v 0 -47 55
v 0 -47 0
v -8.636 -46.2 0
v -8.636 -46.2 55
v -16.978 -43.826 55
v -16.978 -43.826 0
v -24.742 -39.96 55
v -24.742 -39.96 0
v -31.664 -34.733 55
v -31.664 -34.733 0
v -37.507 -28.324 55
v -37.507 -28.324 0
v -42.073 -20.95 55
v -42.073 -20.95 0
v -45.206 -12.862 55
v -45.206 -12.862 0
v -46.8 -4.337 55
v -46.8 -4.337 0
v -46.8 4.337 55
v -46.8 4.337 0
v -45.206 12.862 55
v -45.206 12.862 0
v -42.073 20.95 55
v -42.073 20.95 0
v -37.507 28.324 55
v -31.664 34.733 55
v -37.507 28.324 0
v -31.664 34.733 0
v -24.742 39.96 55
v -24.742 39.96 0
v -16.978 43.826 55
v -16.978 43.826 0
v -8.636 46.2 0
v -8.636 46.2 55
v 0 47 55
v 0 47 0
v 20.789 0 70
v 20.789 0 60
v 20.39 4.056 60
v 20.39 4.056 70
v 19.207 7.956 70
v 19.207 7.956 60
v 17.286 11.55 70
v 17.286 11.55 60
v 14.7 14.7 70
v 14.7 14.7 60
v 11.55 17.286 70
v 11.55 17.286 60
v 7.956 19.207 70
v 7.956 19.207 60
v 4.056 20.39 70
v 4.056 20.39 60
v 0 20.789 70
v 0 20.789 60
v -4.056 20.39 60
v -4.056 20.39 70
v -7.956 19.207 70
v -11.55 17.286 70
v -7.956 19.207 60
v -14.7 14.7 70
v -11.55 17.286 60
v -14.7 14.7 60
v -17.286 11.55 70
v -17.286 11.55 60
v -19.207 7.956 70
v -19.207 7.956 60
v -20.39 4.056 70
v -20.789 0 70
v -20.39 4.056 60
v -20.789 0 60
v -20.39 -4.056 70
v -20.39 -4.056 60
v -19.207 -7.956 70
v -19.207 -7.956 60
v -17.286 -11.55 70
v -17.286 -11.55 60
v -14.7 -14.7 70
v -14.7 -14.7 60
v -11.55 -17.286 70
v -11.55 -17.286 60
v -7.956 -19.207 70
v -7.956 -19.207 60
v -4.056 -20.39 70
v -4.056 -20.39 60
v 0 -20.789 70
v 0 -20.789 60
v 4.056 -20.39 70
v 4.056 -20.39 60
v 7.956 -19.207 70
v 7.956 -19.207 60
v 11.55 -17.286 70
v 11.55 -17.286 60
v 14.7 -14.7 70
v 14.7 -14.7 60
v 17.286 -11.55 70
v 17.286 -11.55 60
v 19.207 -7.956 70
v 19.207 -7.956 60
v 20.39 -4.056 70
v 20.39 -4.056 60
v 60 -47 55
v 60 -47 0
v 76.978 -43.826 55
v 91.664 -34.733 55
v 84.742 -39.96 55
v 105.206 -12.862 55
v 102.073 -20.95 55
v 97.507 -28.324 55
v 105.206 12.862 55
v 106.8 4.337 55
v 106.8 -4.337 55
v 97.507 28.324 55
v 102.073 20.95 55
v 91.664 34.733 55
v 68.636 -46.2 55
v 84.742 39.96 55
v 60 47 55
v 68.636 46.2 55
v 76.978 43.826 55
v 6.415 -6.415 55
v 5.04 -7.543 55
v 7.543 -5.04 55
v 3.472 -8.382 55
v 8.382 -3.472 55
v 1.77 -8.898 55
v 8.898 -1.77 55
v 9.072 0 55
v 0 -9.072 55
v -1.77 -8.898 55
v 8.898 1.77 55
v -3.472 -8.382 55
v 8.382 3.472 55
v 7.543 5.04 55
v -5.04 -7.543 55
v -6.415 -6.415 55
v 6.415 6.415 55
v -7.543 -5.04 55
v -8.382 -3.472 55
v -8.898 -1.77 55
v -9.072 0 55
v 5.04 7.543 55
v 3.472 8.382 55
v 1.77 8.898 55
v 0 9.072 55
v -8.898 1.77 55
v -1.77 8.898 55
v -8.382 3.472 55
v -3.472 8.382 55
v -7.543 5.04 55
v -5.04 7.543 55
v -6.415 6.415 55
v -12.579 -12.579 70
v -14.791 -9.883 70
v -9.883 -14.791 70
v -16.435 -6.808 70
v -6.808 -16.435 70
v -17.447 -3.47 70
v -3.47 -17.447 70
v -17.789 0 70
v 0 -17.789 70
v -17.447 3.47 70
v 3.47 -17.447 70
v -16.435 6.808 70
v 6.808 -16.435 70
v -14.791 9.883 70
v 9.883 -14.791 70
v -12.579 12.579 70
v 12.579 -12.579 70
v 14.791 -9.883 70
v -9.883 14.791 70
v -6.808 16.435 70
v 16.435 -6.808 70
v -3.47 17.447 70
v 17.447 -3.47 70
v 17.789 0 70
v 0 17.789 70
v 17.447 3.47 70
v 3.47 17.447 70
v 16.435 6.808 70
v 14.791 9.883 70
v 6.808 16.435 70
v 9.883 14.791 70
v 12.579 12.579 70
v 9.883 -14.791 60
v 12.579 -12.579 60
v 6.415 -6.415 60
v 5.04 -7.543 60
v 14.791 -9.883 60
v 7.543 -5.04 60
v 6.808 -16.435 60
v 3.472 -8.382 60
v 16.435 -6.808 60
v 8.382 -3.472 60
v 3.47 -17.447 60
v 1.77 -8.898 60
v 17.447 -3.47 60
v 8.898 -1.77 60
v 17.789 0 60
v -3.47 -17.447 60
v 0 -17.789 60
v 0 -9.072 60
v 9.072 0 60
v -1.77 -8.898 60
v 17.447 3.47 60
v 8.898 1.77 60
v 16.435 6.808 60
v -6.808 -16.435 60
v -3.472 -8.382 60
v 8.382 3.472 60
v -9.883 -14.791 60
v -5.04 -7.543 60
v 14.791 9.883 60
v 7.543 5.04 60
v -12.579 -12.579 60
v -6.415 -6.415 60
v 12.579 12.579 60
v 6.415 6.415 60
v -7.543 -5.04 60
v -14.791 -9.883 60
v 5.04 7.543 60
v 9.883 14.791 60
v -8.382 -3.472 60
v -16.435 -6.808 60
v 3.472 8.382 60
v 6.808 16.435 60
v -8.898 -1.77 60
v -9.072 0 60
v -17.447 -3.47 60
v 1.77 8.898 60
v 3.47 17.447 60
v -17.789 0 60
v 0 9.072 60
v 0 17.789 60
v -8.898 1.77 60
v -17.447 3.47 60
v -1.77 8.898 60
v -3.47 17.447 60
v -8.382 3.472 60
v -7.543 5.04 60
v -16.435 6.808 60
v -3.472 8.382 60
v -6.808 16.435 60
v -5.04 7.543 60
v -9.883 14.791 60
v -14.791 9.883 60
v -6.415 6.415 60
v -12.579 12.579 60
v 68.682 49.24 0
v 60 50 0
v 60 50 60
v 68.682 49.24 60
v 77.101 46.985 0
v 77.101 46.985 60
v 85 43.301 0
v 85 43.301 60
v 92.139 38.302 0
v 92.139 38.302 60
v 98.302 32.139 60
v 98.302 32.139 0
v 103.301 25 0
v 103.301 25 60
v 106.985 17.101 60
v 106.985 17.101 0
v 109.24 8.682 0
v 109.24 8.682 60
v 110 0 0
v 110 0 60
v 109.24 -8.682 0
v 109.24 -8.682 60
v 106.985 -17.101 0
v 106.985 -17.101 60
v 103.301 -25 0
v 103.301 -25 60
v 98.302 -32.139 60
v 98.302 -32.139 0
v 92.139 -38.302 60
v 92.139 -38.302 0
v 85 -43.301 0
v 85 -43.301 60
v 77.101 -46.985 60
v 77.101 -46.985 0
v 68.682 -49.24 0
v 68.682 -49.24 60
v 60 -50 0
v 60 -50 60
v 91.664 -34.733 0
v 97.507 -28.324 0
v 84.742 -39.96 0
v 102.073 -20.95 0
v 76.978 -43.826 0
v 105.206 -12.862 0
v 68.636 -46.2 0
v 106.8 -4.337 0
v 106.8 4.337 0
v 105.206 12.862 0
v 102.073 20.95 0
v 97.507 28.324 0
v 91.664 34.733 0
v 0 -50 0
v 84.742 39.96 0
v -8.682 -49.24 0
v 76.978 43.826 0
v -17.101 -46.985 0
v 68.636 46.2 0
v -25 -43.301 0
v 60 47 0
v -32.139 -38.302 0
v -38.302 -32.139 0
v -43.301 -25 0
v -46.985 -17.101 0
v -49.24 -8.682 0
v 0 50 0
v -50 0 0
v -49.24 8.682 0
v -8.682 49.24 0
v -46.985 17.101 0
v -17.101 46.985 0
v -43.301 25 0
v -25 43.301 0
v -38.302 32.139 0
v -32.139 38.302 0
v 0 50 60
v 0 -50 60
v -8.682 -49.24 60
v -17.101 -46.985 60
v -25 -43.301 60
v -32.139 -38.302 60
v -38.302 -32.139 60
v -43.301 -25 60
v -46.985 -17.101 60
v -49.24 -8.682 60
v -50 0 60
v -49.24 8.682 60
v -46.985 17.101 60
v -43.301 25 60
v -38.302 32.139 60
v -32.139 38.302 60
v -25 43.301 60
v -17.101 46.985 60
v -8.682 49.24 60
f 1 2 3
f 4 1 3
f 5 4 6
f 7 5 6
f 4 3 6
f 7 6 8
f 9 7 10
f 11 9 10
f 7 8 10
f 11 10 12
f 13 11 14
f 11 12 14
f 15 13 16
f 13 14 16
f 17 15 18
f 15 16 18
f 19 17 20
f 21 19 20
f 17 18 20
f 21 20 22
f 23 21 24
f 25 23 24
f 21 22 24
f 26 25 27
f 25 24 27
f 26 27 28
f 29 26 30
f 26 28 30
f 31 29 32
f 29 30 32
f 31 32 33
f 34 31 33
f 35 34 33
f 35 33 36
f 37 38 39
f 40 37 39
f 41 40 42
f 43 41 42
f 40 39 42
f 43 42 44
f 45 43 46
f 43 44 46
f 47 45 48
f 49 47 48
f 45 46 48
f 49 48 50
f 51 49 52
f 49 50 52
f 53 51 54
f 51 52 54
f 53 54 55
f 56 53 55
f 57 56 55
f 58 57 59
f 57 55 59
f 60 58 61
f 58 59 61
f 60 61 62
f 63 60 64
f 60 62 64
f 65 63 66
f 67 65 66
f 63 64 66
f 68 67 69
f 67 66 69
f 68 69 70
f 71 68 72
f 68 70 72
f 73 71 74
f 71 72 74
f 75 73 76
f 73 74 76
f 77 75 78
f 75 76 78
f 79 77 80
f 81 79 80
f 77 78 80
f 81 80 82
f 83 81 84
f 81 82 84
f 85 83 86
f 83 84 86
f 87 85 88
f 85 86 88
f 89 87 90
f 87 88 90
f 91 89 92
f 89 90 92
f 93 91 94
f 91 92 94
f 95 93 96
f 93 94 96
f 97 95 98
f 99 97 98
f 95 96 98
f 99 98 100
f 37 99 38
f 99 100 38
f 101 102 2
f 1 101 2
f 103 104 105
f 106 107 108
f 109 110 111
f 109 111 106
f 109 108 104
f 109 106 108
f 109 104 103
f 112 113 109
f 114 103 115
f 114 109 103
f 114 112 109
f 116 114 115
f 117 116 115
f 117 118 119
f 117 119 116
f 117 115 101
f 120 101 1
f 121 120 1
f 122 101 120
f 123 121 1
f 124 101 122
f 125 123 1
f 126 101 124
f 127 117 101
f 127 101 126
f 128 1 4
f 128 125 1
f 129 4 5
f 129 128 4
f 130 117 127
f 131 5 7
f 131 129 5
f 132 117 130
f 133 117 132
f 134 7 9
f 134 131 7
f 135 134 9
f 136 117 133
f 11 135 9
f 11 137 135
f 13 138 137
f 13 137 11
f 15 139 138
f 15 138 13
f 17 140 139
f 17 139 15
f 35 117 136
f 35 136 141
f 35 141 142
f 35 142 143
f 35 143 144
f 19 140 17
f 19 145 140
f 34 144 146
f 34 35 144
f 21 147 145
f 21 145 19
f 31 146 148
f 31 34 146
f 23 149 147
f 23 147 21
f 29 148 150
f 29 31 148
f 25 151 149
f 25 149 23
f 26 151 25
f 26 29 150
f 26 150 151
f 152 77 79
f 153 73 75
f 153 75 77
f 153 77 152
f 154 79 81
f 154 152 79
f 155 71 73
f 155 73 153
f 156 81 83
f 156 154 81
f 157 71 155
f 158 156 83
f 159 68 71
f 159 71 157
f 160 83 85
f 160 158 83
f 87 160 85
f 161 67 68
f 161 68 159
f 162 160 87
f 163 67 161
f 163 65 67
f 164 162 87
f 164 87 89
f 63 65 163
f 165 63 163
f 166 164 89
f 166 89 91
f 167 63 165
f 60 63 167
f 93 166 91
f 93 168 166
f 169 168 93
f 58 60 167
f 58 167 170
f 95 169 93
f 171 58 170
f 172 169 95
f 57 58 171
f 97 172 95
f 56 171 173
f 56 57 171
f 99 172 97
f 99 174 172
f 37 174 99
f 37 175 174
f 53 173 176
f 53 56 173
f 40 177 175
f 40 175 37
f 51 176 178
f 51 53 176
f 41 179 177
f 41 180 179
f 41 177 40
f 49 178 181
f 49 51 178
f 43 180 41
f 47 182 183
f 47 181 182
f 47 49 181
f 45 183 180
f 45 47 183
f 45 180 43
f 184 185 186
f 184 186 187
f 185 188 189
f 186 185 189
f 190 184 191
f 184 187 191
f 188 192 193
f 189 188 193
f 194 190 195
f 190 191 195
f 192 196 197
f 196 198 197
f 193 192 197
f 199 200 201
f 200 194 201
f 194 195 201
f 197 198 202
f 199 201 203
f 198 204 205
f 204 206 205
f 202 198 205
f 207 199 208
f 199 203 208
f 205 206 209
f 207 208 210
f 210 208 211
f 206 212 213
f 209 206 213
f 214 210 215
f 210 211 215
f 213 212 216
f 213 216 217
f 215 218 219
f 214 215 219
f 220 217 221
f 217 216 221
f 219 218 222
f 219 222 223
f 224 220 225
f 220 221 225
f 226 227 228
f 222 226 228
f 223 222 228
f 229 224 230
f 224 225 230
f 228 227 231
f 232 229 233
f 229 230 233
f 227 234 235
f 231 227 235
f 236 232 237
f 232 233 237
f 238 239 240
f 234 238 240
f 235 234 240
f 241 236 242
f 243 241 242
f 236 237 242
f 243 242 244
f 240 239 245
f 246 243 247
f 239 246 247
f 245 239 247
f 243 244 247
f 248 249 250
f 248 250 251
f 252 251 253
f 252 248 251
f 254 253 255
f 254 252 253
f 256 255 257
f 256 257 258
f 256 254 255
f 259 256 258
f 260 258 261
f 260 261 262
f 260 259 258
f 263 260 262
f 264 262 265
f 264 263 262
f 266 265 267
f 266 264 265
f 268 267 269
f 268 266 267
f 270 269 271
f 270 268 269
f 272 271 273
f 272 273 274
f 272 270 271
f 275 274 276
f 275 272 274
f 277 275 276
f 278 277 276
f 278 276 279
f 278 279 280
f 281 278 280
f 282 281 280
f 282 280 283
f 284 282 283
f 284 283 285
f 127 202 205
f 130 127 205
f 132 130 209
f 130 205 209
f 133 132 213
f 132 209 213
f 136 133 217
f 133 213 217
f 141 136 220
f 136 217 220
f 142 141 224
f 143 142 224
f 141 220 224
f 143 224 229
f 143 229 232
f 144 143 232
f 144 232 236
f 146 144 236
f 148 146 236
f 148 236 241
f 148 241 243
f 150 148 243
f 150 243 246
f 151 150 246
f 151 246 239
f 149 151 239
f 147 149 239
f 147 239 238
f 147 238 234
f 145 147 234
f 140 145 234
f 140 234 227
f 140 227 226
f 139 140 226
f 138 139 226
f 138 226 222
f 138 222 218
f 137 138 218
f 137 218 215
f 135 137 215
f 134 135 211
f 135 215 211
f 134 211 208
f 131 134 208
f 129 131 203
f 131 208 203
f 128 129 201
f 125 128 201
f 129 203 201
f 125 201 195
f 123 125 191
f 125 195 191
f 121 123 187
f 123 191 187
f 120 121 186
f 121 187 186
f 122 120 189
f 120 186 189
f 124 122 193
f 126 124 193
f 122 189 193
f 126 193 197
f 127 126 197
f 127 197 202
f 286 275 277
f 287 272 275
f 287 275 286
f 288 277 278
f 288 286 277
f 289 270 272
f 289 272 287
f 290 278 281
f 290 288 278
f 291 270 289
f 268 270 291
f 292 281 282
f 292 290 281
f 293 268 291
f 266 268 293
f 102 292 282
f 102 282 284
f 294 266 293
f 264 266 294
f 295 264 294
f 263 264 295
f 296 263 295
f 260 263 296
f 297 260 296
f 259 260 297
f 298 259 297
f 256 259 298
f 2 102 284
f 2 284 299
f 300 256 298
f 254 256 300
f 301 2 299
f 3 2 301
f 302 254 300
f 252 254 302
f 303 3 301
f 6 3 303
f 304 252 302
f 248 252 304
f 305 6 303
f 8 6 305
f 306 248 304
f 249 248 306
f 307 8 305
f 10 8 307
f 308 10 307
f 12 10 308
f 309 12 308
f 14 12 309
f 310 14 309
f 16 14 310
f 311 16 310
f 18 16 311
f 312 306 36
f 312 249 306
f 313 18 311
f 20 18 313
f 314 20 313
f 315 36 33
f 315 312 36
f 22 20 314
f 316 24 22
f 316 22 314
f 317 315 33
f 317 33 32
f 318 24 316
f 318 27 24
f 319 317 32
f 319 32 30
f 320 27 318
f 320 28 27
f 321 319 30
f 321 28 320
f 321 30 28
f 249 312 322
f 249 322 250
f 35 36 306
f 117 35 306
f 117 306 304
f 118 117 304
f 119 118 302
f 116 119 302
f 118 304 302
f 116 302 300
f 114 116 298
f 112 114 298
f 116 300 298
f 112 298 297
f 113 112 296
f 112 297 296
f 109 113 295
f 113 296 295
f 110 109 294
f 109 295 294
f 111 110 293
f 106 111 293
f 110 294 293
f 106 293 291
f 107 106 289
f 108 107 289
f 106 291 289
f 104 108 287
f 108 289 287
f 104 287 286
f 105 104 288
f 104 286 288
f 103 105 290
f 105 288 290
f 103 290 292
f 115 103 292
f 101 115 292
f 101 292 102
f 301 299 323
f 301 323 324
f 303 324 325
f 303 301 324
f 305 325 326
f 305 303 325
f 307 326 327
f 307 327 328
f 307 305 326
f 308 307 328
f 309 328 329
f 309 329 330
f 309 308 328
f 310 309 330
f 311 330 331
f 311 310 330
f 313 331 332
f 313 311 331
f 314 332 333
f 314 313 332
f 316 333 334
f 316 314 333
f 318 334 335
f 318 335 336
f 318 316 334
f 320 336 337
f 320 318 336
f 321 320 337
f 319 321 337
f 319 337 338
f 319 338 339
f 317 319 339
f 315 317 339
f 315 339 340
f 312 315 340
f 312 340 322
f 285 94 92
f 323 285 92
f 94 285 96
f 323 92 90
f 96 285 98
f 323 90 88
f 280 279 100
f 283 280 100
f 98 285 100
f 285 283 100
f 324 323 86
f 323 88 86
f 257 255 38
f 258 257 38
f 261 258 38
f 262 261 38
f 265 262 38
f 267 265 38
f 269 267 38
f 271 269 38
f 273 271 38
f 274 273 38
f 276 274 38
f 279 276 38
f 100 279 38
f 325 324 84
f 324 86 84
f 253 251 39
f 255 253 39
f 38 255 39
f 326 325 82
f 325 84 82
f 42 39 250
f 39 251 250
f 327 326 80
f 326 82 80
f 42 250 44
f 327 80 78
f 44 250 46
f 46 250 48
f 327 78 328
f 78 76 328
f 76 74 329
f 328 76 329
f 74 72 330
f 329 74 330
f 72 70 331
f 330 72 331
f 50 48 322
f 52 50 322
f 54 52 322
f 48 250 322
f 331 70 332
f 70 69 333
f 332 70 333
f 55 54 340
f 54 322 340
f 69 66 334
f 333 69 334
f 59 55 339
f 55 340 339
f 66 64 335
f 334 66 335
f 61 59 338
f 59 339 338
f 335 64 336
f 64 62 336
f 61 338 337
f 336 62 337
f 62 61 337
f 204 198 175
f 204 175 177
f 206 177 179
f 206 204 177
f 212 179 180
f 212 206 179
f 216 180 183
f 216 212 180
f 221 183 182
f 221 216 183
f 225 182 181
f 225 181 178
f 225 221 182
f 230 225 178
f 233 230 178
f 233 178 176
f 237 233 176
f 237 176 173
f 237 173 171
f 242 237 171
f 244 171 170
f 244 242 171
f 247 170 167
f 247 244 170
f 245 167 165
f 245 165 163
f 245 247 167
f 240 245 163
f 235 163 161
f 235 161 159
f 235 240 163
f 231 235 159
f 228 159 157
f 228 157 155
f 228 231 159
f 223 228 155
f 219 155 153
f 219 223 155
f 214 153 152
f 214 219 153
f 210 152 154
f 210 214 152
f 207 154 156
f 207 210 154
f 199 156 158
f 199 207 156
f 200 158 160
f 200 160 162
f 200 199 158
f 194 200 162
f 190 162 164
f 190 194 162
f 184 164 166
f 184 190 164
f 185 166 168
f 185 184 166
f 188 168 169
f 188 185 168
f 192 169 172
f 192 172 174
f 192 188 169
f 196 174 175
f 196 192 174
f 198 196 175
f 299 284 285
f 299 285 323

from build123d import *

# Parameters (mm, degrees)
EXTRUDE_1_DEPTH     = 60
CUT_EXTRUDE_1_DEPTH = 55
SKETCH_3_R          = 20.789145554
SKETCH_3_R_2        = 17.789145554
EXTRUDE_2_DEPTH     = 10
SKETCH_4_R          = 9.072208596
CUT_EXTRUDE_5_DEPTH = 135.907375632


with BuildPart() as part:
    # 草图1 → 凸台-拉伸1 (new body)
    with BuildSketch(Plane.XY):
        with BuildLine():
            Line((0, 50), (60, 50))
            ThreePointArc((60, 50), (110, 0), (60, -50))
            Line((60, -50), (0, -50))
            ThreePointArc((0, -50), (-50, 0), (0, 50))
        make_face()
    extrude(amount=EXTRUDE_1_DEPTH)

    # 草图2 → 切除-拉伸1 (cut)
    with BuildSketch(Plane(origin=(0, 0, 0), x_dir=(-1, 0, 0), z_dir=(0, 0, -1))):
        with BuildLine():
            Line((-60, -47), (0, -47))
            ThreePointArc((0, -47), (47, 0), (0, 47))
            Line((0, 47), (-60, 47))
            ThreePointArc((-60, 47), (-107, 0), (-60, -47))
        make_face()
    extrude(amount=-CUT_EXTRUDE_1_DEPTH, mode=Mode.SUBTRACT)

    # 草图3 → 凸台-拉伸2 (add)
    with BuildSketch(Plane.XY.offset(60)):
        Circle(SKETCH_3_R)
        Circle(SKETCH_3_R_2, mode=Mode.SUBTRACT)
    extrude(amount=EXTRUDE_2_DEPTH)

    # 草图4 → 切除-拉伸5 (cut, through all)
    with BuildSketch(Plane.XY.offset(60)):
        Circle(SKETCH_4_R)
    extrude(amount=-CUT_EXTRUDE_5_DEPTH, mode=Mode.SUBTRACT)


solid = part.part
